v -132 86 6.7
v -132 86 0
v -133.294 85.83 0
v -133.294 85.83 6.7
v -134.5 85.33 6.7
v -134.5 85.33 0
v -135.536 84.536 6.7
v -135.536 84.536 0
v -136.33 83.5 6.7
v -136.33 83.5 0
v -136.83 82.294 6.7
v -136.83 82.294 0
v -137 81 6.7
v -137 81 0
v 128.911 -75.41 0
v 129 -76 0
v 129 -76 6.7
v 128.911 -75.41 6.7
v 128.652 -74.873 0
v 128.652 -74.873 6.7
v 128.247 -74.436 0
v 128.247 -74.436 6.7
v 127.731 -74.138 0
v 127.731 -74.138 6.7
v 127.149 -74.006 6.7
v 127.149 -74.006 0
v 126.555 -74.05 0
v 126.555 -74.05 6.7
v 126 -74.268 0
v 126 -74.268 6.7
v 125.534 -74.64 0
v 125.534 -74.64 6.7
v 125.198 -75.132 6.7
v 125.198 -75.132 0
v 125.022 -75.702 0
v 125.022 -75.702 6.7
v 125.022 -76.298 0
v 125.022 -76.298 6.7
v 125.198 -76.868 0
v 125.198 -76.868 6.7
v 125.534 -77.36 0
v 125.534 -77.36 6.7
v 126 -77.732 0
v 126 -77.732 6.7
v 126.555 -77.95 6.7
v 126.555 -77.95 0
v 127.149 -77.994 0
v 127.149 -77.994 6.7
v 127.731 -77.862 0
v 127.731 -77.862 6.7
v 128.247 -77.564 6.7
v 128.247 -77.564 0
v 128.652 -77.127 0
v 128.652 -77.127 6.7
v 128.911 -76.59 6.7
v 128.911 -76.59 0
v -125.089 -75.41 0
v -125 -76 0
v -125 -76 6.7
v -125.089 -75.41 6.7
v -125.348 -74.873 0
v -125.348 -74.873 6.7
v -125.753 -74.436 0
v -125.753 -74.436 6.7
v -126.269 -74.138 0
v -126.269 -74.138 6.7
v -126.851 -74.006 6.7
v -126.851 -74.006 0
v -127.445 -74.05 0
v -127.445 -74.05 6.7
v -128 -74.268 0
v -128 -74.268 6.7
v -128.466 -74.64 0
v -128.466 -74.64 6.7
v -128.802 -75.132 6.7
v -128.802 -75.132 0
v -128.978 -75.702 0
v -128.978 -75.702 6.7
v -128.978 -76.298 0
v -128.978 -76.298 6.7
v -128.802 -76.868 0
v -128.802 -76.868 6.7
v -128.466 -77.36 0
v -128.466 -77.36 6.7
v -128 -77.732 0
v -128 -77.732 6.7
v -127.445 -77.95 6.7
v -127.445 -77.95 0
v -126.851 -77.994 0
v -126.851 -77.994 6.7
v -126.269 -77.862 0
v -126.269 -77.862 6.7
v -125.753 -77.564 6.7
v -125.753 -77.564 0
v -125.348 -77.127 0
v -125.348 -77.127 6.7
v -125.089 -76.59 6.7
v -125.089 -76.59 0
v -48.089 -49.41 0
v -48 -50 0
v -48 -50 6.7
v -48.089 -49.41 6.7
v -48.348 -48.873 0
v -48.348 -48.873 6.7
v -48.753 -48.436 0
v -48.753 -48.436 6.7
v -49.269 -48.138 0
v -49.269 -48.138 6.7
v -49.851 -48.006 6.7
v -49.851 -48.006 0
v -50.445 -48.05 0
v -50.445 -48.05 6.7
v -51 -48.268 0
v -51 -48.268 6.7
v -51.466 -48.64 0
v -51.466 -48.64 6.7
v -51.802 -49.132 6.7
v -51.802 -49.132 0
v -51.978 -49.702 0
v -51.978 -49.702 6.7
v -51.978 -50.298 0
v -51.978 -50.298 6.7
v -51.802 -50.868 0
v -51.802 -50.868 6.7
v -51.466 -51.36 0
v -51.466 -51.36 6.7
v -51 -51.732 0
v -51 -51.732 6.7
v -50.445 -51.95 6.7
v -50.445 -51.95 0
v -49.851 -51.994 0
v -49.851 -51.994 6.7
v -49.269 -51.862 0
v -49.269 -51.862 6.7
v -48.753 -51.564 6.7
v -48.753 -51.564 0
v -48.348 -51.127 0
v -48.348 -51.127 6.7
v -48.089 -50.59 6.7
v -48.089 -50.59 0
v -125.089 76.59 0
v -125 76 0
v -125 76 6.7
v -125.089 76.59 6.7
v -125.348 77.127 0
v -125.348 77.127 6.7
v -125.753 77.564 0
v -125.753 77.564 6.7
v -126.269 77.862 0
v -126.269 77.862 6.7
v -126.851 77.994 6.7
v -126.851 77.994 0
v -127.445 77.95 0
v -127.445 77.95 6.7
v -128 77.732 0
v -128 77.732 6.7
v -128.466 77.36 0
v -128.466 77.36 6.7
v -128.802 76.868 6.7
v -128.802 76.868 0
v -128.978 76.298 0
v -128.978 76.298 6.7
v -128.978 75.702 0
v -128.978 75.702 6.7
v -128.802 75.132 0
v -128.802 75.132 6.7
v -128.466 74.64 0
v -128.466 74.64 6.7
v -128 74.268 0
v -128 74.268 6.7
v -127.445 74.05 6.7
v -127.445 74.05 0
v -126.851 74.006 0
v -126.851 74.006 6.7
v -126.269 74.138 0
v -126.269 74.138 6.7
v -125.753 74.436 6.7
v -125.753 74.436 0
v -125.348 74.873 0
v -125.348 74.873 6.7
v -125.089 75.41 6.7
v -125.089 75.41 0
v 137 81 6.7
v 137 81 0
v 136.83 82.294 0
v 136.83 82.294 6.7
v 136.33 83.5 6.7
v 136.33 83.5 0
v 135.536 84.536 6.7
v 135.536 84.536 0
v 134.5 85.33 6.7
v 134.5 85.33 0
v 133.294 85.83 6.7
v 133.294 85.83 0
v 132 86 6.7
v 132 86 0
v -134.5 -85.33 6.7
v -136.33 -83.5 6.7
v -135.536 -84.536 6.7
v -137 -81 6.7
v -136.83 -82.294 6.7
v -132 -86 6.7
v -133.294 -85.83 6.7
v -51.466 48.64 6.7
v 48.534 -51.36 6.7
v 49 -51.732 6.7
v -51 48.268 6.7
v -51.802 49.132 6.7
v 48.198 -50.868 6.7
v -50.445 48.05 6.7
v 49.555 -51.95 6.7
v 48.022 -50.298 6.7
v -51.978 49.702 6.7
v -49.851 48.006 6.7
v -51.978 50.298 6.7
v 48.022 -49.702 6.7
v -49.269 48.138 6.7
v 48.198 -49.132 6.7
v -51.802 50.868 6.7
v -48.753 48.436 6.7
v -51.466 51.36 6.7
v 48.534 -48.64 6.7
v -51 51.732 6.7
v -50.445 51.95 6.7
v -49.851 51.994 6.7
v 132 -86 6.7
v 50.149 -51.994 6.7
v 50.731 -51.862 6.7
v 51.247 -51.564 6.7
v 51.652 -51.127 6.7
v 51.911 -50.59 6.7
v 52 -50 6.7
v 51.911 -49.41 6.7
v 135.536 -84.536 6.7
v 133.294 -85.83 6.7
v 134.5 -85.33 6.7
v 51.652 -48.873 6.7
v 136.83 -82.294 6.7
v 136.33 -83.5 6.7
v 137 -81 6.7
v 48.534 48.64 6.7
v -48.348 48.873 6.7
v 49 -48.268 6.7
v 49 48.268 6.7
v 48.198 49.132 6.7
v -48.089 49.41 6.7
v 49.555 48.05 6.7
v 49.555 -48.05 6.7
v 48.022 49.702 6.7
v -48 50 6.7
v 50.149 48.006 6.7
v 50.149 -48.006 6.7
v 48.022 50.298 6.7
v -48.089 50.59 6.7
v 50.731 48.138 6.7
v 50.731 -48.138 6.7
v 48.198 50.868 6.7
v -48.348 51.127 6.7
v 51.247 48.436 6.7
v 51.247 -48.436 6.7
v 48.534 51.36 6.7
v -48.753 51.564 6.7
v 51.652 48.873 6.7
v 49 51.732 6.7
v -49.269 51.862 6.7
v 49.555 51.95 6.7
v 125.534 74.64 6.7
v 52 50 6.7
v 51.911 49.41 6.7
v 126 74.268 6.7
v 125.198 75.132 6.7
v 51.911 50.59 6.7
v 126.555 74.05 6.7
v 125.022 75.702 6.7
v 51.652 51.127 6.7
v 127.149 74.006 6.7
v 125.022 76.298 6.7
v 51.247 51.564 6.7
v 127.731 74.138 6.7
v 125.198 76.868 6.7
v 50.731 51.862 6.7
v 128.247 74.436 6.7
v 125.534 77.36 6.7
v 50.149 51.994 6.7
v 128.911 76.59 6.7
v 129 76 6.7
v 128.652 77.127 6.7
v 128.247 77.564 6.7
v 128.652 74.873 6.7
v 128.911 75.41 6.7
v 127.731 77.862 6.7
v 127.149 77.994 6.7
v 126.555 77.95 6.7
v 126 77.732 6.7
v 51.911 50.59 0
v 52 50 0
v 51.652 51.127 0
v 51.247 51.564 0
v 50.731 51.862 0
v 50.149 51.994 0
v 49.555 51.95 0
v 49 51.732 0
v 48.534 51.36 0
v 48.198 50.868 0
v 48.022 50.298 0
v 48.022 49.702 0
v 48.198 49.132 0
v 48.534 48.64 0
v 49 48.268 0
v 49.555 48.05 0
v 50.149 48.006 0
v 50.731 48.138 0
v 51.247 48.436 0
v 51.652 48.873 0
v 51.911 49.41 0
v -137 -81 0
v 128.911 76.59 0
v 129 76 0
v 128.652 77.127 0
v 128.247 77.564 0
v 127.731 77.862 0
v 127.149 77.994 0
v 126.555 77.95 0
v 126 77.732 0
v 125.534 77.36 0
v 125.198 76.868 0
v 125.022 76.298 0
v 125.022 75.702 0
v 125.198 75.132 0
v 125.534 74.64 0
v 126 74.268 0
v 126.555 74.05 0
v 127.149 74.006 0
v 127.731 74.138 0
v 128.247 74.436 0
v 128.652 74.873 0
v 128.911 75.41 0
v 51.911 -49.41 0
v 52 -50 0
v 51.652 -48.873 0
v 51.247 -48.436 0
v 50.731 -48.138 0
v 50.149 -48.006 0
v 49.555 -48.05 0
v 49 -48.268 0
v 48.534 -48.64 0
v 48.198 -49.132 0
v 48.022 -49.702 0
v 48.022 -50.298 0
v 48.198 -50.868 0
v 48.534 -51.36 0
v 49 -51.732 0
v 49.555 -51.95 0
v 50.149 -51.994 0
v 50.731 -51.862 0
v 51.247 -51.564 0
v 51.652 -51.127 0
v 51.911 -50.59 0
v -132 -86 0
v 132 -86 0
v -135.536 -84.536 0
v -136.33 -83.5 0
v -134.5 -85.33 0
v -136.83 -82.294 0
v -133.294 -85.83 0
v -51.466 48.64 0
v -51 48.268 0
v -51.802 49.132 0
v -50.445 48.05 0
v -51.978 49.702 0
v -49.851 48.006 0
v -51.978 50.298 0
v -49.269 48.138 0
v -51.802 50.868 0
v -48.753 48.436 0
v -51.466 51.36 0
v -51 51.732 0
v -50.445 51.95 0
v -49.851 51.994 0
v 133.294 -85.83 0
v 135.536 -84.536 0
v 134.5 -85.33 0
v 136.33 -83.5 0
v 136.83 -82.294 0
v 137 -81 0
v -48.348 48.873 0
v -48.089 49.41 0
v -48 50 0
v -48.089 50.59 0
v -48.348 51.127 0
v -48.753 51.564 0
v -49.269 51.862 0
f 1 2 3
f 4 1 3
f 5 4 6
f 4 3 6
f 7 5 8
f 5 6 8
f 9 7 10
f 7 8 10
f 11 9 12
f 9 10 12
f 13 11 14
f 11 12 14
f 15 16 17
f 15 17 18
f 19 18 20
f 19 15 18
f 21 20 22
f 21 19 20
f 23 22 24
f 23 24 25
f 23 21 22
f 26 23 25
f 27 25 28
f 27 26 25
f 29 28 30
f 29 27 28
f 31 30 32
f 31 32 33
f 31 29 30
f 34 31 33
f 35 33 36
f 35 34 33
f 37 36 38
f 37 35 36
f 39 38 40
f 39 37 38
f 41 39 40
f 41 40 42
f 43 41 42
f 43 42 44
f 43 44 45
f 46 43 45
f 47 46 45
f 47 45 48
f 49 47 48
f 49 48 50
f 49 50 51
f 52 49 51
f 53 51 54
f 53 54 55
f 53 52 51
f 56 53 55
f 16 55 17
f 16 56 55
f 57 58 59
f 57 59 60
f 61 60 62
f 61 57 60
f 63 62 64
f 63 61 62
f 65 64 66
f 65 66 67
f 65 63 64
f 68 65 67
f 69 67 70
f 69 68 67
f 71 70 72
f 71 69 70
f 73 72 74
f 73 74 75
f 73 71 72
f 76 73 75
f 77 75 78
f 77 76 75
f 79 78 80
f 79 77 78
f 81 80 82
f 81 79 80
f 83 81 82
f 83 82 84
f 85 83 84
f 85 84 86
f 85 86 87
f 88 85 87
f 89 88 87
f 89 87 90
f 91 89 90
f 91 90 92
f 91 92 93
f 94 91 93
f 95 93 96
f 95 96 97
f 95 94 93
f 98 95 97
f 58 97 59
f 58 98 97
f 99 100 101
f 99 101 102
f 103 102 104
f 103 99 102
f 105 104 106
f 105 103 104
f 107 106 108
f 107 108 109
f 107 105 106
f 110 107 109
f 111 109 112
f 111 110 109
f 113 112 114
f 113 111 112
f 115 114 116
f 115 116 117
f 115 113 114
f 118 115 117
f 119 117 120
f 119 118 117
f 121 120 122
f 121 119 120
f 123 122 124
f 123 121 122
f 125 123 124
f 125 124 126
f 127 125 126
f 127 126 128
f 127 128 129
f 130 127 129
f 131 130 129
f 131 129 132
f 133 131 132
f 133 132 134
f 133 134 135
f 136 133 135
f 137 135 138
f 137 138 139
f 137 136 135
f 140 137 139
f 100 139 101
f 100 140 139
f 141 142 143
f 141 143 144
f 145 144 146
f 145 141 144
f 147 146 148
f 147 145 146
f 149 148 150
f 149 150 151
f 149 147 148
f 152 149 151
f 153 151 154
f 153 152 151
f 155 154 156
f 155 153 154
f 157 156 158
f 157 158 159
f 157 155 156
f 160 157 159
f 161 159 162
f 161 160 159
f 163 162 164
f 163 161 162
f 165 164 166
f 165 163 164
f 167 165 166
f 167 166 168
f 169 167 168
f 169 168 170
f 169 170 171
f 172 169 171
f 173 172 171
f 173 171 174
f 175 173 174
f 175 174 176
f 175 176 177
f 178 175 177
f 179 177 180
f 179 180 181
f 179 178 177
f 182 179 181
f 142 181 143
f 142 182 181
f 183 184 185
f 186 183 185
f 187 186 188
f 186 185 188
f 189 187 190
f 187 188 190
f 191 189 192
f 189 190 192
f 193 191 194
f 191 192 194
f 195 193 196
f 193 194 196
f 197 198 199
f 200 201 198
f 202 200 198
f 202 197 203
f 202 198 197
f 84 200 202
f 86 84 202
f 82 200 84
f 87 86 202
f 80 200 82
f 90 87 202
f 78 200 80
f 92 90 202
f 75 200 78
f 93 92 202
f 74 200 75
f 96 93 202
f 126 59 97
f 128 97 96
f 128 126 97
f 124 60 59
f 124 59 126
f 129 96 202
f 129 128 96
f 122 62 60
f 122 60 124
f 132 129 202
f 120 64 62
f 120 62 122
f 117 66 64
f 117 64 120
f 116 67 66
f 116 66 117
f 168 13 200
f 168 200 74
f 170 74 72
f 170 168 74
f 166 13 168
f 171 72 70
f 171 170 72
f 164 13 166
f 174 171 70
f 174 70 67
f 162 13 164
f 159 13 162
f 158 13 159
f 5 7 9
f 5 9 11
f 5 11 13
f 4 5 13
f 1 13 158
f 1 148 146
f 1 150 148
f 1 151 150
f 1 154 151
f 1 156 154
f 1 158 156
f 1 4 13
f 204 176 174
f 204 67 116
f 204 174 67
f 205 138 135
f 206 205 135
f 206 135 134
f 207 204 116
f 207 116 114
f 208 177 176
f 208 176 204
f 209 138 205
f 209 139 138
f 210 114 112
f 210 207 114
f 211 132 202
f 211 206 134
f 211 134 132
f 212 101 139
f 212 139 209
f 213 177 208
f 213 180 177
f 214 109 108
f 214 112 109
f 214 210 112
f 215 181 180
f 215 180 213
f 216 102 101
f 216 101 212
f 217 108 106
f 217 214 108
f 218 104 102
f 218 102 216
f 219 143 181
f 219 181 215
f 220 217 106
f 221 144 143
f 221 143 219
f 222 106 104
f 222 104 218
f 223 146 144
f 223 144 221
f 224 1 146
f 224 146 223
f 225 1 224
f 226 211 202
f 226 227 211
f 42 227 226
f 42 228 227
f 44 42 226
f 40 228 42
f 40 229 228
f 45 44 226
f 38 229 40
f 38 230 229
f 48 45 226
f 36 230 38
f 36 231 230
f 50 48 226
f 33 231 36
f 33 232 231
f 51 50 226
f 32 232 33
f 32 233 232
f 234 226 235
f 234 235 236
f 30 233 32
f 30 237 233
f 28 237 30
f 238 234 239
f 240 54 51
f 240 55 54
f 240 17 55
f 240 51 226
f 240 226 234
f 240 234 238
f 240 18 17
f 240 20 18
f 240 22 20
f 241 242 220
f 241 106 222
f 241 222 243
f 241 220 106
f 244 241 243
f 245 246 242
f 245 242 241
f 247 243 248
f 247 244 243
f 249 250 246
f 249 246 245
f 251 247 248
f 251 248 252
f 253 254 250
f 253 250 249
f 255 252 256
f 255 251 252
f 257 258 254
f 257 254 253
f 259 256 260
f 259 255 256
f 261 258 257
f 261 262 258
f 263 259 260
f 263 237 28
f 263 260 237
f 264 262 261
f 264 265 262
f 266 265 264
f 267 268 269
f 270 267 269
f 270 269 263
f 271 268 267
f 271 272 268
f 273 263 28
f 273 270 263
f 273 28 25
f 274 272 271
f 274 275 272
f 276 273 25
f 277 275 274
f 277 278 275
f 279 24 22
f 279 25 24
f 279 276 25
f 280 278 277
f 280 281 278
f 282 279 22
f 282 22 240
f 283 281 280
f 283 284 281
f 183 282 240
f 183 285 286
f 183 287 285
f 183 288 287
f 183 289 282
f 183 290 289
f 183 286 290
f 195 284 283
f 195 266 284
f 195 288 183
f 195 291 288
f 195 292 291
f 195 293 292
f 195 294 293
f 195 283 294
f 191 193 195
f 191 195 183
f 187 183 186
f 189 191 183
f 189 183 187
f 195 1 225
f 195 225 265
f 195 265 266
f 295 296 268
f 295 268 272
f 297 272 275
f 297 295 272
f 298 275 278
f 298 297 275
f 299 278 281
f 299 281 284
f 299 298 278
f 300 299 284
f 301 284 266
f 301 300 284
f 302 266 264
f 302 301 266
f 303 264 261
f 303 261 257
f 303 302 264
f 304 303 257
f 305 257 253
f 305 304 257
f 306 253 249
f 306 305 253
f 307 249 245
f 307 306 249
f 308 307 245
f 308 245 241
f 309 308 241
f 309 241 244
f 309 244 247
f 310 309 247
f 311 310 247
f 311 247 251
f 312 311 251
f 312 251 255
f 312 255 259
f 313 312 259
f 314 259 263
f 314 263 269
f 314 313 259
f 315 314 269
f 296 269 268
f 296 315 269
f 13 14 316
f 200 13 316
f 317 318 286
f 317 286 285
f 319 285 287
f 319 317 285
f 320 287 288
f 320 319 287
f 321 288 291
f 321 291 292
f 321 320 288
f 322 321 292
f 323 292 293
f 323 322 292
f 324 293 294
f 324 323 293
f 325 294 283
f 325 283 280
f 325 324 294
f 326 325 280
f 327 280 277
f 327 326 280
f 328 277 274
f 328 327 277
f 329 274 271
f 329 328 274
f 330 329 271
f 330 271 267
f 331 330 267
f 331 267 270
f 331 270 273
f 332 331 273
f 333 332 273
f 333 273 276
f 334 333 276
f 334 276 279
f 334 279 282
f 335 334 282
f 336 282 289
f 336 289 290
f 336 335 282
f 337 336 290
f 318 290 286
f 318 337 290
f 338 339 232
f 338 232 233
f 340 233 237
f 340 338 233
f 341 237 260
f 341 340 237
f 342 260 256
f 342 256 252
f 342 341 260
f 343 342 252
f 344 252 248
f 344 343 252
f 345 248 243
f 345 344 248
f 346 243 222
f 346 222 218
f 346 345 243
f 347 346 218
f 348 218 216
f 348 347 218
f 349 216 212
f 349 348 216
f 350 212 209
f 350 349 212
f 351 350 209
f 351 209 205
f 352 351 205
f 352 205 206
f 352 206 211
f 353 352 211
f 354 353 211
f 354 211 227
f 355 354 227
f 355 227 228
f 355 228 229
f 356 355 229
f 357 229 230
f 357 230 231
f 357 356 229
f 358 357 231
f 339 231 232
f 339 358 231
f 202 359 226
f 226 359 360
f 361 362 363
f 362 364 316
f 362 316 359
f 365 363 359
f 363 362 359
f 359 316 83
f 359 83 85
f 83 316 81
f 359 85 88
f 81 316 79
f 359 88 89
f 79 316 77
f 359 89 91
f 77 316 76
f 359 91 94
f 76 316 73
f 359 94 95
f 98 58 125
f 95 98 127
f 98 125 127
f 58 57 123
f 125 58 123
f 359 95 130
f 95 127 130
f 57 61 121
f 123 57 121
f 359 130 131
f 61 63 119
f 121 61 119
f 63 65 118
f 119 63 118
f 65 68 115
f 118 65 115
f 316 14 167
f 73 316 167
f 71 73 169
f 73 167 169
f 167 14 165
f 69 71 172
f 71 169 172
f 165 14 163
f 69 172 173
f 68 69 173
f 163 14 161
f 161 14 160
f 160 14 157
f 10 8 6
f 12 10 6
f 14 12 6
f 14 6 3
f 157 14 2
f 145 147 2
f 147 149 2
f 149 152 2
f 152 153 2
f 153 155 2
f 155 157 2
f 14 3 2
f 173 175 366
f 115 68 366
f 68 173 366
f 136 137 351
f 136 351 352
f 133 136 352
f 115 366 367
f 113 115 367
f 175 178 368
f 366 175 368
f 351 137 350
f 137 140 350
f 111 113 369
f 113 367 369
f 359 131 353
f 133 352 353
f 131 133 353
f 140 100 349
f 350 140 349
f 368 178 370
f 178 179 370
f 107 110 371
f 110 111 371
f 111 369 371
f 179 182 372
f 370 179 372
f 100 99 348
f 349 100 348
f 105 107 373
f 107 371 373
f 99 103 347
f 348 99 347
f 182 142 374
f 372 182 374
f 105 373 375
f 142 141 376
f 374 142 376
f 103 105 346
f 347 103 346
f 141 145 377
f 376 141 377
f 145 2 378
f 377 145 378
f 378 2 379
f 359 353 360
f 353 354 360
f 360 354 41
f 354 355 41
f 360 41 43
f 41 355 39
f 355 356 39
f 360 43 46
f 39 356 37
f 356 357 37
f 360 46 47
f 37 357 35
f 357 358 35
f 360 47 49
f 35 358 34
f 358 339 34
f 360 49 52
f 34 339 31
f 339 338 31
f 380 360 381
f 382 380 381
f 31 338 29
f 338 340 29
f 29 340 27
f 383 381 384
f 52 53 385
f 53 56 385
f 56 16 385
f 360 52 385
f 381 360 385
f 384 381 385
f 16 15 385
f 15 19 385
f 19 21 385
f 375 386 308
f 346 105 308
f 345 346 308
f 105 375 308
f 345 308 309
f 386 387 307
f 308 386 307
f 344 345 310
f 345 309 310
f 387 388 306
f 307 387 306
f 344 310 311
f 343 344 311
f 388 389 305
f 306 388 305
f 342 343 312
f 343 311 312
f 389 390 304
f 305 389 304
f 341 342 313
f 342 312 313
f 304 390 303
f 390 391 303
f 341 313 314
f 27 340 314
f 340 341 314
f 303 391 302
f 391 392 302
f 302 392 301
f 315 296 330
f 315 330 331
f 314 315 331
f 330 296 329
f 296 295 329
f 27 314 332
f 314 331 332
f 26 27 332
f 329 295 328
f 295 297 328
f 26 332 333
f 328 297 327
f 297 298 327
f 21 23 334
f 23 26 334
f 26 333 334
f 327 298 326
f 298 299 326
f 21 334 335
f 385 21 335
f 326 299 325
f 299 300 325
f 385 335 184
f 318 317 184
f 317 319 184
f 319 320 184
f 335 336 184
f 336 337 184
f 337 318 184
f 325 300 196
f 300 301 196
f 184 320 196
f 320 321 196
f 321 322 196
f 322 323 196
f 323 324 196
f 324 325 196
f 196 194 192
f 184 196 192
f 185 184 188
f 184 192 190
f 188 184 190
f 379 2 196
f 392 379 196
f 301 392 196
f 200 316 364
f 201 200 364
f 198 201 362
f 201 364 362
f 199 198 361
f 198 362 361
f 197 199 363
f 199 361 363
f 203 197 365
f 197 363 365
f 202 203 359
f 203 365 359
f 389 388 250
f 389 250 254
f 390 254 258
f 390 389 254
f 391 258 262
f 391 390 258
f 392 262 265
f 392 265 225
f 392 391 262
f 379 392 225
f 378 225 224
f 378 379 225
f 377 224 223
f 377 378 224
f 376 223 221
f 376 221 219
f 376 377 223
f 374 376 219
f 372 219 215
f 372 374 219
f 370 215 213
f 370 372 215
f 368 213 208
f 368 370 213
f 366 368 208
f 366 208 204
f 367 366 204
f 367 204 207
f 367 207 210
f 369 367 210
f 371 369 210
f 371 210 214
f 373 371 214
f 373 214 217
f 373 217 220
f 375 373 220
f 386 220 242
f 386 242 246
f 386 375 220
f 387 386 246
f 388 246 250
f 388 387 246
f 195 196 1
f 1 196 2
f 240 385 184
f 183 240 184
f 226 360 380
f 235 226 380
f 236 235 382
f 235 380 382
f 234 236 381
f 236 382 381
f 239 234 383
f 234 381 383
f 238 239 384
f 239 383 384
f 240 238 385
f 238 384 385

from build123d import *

# Parameters (mm, degrees)
F0_R     = 2
F1_DEPTH = 6.7


with BuildPart() as f1:
    # F0 (on Top) → F1 (new body)
    with BuildSketch(Plane.XY):
        with BuildLine():
            ThreePointArc((137, 81), (135.535534, 84.535534), (132, 86))
            Line((132, 86), (-132, 86))
            ThreePointArc((-132, 86), (-135.535534, 84.535534), (-137, 81))
            Line((-137, 81), (-137, -81))
            ThreePointArc((-137, -81), (-135.535534, -84.535534), (-132, -86))
            Line((-132, -86), (132, -86))
            ThreePointArc((132, -86), (135.535534, -84.535534), (137, -81))
            Line((137, -81), (137, 81))
        make_face()
        with Locations((-127, -76)):
            Circle(F0_R, mode=Mode.SUBTRACT)
        with Locations((-50, -50)):
            Circle(F0_R, mode=Mode.SUBTRACT)
        with Locations((50, -50)):
            Circle(F0_R, mode=Mode.SUBTRACT)
        with Locations((127, -76)):
            Circle(F0_R, mode=Mode.SUBTRACT)
        with Locations((-127, 76)):
            Circle(F0_R, mode=Mode.SUBTRACT)
        with Locations((-50, 50)):
            Circle(F0_R, mode=Mode.SUBTRACT)
        with Locations((50, 50)):
            Circle(F0_R, mode=Mode.SUBTRACT)
        with Locations((127, 76)):
            Circle(F0_R, mode=Mode.SUBTRACT)
    extrude(amount=F1_DEPTH)


solid = f1.part
